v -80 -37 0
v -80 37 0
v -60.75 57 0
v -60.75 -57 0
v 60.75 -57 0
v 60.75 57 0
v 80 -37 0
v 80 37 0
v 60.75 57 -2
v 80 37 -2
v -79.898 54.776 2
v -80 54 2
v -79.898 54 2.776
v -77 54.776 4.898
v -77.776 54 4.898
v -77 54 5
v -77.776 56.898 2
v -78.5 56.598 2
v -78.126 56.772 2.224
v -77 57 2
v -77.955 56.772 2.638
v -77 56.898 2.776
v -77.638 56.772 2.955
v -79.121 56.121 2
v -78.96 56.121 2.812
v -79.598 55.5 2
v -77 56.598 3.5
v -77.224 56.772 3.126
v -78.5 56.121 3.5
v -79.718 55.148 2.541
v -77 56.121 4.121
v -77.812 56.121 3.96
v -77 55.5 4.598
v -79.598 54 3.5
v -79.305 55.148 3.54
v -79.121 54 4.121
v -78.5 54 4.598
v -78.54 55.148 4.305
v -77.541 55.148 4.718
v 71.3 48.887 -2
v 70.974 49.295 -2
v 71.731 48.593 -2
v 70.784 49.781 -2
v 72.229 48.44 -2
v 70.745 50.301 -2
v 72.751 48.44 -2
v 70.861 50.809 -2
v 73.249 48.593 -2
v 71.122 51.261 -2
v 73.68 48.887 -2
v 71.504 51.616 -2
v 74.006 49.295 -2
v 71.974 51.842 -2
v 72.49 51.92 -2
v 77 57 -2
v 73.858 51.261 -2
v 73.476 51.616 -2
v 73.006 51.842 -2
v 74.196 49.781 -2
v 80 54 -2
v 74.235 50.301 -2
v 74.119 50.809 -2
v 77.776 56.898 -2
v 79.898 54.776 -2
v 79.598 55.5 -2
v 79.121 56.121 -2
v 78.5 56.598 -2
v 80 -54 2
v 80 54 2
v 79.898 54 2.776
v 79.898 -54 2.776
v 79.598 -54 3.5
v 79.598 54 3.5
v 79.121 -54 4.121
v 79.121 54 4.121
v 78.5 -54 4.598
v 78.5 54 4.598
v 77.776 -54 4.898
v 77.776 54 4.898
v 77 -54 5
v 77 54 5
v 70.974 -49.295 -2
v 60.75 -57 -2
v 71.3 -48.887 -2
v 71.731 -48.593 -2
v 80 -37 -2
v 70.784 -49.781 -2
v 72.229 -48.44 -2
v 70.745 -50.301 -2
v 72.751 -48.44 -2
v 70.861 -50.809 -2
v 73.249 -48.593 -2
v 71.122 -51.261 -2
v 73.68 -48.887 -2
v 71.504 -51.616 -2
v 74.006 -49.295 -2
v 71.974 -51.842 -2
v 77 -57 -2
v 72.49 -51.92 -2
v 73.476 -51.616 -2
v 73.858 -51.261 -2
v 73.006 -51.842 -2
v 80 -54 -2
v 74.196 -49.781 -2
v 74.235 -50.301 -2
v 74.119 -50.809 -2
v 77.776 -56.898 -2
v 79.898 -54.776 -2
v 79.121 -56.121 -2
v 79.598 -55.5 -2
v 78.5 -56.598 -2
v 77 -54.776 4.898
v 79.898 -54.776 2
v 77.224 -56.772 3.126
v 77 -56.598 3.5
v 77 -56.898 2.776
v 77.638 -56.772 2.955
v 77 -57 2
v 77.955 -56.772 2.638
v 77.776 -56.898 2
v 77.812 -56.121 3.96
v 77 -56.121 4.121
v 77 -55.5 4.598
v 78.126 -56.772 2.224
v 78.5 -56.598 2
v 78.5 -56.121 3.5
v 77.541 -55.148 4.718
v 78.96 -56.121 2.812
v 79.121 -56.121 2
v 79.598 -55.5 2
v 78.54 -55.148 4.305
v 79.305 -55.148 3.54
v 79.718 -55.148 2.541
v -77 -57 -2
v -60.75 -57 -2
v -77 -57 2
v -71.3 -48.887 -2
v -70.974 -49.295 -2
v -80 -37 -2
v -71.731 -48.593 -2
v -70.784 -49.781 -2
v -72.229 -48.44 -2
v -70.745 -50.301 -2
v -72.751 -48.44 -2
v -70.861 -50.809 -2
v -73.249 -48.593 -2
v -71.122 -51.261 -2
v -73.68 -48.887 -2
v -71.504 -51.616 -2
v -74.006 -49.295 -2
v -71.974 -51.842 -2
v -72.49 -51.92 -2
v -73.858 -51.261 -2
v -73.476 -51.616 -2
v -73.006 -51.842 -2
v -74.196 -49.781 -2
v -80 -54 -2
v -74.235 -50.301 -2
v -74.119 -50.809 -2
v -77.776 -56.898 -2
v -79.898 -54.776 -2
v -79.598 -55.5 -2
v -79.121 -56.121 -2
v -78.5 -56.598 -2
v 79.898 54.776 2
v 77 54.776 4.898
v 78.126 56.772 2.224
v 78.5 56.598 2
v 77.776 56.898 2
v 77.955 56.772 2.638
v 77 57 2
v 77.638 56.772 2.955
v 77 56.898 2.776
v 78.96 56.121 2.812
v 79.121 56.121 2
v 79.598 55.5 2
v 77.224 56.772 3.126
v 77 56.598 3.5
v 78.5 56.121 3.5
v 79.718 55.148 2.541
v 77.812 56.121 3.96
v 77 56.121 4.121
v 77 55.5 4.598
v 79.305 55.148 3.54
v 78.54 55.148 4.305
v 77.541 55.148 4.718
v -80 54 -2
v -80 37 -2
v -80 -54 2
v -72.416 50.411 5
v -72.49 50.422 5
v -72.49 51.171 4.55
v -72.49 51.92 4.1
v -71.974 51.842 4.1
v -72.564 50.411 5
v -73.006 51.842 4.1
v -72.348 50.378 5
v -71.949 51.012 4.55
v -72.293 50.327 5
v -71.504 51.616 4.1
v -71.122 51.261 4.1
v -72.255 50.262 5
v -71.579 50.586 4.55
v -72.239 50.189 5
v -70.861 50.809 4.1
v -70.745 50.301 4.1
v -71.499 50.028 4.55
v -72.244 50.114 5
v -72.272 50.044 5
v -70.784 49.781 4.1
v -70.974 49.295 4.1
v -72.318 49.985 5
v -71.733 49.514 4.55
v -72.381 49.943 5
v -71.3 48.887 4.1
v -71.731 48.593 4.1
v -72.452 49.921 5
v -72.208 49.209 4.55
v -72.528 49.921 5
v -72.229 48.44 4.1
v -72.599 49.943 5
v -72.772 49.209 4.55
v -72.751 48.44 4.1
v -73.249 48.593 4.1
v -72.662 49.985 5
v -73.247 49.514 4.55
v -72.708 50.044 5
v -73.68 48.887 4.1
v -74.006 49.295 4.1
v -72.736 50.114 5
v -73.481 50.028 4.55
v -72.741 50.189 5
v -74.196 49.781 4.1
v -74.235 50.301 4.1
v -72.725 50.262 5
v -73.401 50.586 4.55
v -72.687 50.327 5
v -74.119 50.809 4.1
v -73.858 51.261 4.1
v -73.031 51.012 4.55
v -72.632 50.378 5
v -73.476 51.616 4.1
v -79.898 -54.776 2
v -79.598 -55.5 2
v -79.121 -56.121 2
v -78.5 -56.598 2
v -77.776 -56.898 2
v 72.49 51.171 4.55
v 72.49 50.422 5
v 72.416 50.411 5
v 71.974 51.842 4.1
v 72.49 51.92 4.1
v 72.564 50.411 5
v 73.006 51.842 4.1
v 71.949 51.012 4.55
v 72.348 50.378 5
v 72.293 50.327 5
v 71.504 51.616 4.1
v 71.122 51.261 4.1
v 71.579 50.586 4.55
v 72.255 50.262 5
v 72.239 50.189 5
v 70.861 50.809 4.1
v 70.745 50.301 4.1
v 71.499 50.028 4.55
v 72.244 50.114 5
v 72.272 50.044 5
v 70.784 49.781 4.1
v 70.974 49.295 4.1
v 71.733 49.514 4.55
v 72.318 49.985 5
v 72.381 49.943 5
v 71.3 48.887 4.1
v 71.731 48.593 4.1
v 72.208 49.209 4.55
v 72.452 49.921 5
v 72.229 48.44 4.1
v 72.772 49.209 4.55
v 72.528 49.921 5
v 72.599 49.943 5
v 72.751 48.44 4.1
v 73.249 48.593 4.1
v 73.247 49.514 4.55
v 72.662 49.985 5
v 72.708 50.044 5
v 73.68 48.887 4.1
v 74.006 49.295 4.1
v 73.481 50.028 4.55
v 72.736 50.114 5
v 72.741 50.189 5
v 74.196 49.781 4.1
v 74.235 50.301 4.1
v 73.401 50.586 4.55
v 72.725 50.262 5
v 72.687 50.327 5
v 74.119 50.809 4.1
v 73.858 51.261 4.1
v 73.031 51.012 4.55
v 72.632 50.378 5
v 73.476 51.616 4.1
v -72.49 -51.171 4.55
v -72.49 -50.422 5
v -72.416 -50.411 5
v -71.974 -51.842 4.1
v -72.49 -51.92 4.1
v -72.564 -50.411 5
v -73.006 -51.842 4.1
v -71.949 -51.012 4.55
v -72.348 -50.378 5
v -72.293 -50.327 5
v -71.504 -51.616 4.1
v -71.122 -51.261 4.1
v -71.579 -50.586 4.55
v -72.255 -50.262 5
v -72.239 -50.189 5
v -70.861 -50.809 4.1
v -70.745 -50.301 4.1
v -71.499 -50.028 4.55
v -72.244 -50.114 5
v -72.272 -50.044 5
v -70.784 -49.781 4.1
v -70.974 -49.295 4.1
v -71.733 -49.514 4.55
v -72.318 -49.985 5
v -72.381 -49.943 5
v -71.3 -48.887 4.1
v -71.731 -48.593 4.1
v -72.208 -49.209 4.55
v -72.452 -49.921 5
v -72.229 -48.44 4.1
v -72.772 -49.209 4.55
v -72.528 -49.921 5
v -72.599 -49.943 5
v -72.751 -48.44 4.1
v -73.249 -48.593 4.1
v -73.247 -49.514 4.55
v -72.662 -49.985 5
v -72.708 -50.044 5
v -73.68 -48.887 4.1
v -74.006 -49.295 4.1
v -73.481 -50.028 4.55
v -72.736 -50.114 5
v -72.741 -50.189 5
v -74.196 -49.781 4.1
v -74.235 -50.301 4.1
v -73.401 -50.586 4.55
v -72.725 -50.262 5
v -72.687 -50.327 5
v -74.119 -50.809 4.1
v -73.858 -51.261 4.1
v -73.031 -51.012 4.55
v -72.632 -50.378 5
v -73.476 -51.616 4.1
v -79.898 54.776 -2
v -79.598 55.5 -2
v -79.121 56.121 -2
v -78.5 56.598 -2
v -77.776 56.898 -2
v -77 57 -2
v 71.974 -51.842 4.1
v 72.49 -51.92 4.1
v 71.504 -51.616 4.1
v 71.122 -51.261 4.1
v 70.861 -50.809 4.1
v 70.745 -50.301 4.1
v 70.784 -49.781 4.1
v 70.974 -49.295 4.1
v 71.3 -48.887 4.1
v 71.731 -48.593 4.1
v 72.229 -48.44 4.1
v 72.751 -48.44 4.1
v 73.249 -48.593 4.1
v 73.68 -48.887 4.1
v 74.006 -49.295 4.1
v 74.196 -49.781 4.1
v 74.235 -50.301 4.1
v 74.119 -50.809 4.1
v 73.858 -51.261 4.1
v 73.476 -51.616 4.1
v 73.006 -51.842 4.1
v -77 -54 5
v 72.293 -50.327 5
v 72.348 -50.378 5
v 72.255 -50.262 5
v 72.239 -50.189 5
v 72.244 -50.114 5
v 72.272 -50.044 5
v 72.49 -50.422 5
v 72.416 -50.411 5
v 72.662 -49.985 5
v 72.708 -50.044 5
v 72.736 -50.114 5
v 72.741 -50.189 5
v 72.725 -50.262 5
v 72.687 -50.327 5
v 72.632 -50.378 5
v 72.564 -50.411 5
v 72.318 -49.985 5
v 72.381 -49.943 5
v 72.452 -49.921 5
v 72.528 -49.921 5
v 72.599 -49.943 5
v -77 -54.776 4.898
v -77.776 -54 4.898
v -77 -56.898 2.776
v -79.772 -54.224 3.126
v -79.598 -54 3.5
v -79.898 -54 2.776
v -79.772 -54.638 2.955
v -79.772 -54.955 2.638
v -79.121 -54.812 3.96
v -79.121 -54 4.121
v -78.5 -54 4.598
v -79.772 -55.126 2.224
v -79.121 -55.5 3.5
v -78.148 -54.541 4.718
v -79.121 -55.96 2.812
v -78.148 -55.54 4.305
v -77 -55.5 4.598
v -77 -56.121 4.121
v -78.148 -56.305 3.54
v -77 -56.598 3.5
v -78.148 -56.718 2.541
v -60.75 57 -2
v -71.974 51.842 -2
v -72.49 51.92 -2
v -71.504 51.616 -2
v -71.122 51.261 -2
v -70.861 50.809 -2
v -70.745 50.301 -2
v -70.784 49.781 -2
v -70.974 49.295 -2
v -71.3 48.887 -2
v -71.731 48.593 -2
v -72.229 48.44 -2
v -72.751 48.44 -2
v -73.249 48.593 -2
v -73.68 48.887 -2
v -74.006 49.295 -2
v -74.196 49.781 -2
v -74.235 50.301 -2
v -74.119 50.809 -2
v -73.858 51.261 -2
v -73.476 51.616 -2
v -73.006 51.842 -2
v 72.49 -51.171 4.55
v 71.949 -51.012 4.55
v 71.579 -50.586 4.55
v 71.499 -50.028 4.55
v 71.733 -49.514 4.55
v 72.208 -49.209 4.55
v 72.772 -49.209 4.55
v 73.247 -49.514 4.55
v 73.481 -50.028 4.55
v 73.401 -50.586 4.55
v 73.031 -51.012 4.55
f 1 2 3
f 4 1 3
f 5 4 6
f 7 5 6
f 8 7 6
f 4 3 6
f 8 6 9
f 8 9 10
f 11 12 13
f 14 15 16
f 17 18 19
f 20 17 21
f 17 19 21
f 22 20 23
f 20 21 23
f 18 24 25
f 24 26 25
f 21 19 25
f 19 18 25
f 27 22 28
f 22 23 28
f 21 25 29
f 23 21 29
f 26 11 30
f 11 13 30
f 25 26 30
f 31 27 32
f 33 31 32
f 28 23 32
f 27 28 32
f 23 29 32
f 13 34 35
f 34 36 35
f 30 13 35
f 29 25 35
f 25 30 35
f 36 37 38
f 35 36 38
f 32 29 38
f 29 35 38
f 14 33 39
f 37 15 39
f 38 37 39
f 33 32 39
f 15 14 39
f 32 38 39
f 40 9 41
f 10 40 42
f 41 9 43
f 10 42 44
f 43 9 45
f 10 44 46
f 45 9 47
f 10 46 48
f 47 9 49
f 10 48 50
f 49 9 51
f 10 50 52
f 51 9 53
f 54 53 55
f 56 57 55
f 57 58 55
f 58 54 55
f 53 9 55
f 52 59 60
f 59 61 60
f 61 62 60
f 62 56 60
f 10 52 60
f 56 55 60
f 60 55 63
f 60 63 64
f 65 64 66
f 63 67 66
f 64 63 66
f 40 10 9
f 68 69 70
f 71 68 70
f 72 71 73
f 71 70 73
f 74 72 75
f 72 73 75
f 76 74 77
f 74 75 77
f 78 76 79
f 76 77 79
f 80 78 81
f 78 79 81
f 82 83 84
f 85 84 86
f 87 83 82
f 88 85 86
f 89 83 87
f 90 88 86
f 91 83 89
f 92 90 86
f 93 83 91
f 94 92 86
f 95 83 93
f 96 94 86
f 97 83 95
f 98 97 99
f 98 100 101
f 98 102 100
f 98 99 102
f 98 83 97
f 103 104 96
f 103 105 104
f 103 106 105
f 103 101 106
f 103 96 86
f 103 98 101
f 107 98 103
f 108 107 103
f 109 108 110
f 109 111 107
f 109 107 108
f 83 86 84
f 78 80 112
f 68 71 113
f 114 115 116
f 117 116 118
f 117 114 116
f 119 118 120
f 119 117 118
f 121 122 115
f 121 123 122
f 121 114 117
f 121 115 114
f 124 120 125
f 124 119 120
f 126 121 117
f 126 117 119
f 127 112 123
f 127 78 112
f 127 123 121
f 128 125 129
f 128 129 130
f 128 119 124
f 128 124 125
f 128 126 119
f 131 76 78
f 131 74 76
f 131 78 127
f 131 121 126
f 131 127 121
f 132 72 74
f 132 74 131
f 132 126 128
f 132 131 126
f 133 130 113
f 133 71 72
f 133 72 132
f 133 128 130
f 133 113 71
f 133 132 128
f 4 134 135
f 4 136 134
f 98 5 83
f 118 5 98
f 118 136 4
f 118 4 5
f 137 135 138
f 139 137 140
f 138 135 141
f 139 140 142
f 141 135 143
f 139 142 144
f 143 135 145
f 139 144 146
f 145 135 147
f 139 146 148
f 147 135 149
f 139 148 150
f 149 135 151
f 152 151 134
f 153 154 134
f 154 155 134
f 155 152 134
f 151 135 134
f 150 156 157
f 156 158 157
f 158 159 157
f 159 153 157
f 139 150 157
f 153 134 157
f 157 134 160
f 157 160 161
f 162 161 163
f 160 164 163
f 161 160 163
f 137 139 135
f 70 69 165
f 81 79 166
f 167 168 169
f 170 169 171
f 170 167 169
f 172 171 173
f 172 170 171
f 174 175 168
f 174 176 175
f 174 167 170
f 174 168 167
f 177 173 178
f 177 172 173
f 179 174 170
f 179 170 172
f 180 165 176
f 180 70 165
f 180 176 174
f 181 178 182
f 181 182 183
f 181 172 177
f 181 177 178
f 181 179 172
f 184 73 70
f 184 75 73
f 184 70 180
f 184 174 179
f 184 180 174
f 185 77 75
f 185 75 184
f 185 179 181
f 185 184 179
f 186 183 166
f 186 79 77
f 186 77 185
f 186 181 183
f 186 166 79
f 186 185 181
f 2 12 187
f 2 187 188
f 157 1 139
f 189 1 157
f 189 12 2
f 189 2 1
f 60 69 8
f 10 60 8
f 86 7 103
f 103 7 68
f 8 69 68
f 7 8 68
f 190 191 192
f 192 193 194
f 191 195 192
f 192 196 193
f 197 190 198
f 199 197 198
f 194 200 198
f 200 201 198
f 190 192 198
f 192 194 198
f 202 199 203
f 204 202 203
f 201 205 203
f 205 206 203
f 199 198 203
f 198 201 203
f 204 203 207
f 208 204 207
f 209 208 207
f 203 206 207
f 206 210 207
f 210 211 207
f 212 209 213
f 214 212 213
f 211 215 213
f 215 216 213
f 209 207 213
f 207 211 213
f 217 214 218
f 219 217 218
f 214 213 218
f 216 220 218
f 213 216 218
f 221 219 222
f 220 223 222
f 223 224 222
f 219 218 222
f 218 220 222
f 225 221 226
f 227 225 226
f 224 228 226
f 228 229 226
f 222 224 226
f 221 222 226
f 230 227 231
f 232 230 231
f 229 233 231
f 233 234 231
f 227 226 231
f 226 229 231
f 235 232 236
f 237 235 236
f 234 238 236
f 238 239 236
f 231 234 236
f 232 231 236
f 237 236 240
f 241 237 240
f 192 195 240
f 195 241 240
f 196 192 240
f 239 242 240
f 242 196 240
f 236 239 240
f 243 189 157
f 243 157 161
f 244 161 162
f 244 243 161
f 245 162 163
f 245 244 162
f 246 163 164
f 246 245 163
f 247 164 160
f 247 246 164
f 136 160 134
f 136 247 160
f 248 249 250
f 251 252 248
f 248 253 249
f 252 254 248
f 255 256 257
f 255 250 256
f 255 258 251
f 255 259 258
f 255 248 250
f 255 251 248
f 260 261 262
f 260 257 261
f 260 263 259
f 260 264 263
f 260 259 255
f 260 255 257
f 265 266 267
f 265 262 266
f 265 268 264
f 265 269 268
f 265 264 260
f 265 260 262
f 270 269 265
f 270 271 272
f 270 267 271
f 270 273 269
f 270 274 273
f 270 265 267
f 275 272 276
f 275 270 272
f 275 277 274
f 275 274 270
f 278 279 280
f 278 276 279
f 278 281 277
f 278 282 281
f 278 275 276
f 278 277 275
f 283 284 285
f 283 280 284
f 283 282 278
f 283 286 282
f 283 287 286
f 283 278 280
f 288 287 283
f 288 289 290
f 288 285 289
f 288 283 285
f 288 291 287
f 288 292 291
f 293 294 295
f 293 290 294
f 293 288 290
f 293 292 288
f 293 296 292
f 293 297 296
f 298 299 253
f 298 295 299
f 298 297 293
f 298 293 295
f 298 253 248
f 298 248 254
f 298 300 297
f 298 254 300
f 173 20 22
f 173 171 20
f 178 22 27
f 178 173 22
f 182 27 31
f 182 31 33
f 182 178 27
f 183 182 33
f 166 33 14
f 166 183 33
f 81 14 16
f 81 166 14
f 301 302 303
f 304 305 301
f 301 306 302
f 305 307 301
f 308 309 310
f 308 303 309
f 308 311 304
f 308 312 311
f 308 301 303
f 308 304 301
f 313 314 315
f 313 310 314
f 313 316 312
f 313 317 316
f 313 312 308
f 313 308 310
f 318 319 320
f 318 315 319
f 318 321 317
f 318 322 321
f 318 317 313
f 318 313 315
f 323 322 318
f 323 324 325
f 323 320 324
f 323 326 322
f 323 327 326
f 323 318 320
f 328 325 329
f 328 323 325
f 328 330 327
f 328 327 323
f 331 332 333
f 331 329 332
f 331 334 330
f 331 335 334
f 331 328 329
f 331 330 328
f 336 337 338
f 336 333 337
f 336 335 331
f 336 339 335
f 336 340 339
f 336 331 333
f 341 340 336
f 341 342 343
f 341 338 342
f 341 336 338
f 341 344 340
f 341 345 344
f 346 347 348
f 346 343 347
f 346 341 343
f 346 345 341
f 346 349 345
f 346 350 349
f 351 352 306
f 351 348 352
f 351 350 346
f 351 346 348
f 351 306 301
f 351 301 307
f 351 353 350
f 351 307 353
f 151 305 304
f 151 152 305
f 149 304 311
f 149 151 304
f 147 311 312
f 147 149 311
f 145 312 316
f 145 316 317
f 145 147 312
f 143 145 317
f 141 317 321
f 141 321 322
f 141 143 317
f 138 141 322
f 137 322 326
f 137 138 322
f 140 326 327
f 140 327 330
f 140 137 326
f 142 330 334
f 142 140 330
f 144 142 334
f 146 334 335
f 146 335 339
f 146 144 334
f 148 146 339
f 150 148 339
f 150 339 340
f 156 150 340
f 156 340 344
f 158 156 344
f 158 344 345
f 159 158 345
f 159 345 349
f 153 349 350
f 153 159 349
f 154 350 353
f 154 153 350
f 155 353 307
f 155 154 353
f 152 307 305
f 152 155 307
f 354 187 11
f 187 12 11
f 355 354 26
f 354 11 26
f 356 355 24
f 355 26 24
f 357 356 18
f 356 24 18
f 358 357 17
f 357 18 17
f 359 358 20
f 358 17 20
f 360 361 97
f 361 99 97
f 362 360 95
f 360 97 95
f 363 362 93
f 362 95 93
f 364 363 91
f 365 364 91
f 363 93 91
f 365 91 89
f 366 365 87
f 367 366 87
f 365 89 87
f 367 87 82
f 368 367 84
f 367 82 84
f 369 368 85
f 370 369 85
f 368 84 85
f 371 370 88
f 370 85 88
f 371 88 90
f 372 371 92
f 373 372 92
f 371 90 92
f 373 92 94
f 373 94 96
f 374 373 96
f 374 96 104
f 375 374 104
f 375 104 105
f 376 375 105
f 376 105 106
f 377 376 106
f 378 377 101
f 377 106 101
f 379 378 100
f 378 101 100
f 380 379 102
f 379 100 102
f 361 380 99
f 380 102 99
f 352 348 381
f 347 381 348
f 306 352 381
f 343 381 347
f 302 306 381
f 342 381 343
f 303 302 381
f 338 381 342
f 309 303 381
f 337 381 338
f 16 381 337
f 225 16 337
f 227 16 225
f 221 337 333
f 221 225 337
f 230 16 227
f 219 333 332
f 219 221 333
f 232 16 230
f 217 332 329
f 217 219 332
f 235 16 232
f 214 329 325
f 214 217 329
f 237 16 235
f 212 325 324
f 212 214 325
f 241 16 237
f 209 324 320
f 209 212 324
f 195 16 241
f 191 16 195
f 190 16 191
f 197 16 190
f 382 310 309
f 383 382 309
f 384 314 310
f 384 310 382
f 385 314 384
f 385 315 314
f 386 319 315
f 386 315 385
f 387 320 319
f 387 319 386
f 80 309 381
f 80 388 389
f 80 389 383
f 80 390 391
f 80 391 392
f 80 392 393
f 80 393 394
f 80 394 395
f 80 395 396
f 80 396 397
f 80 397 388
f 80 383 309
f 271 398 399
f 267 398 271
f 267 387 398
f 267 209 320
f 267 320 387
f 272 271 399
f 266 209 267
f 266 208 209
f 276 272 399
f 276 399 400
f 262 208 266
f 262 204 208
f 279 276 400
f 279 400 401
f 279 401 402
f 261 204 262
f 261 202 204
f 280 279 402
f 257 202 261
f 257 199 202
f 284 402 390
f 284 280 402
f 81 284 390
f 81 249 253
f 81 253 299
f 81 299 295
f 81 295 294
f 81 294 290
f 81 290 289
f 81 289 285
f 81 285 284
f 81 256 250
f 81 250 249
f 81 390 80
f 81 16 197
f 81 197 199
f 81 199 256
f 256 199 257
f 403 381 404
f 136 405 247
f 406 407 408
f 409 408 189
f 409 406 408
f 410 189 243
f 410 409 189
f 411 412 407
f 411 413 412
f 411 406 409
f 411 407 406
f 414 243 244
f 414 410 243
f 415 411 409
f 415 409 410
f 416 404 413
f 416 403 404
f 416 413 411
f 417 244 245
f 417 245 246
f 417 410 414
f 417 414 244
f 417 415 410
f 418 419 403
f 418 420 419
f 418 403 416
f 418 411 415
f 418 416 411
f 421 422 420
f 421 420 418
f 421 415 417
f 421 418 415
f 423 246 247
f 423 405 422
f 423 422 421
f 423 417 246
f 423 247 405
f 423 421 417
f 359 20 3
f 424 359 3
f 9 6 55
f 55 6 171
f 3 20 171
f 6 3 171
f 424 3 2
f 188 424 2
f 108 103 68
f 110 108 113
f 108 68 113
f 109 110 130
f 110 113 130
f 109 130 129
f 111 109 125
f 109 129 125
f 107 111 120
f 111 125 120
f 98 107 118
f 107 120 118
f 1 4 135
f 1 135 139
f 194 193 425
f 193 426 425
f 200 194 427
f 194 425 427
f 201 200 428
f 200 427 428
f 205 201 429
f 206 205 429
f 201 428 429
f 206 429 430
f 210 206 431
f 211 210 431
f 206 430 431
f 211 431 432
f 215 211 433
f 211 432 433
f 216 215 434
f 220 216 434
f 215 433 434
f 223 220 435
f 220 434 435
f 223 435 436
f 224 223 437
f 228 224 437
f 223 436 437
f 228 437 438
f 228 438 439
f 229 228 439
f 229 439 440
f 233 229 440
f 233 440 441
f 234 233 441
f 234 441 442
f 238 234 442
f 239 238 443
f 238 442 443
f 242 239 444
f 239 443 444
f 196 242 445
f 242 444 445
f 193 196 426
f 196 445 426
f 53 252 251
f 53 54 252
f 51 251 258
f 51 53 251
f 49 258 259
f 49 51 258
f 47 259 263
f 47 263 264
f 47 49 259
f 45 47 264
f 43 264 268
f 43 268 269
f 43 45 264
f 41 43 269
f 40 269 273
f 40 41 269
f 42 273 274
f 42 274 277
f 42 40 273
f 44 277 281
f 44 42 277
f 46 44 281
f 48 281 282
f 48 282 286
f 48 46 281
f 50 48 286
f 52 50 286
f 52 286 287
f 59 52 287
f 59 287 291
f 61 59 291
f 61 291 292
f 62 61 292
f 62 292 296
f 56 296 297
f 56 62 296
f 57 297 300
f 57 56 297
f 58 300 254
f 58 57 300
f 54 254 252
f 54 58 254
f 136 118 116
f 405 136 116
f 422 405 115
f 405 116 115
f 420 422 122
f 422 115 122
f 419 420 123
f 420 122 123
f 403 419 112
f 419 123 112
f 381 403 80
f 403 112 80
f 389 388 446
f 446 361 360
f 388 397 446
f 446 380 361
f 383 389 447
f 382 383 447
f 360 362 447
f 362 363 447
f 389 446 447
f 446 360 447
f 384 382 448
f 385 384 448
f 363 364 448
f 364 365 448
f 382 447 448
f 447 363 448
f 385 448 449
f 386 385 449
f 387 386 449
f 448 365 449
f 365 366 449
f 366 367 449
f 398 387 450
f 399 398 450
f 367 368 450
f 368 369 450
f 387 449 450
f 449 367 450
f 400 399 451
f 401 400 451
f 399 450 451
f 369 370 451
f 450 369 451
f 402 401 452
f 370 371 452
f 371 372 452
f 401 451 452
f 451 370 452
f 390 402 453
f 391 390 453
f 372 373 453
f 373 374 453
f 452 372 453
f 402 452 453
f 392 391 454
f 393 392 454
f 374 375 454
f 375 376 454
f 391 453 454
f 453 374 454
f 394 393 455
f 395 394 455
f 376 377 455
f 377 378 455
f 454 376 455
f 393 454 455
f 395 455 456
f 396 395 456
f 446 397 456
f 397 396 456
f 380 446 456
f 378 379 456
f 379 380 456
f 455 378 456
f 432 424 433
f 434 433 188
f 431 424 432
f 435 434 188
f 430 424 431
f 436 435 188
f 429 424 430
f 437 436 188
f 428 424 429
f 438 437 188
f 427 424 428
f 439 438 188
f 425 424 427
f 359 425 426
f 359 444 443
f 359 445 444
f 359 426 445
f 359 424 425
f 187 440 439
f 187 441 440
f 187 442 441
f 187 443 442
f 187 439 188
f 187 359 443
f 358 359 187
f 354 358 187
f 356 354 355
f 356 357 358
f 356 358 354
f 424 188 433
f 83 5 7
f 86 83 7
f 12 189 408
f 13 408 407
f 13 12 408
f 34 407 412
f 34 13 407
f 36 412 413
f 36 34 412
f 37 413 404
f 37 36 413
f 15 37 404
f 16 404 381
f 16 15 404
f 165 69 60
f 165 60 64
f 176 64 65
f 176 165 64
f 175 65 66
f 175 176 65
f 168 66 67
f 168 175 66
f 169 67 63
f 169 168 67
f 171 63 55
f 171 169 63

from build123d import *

# Parameters (mm, degrees)
SKETCH2_W                                = 160
SKETCH2_H                                = 114
BOSS_EXTRUDE1_DEPTH                      = 5
FILLET1_R                                = 3
BOSS_EXTRUDE2_DEPTH                      = 2
MIRROR1_AT_THE_SECOND_PLANE_COPY_1_DEPTH = 2


with BuildPart() as part:
    # Sketch2 → Boss-Extrude1 (new body)
    with BuildSketch(Plane.XY):
        Rectangle(SKETCH2_W, SKETCH2_H)
    extrude(amount=BOSS_EXTRUDE1_DEPTH)

    # Fillet1
    fillet1_edges = [part.edges().sort_by_distance(p)[0] for p in [
        (80, 0, 5),
        (0, -57, 5),
        (-80, 0, 5),
        (-80, -57, 2.5),
        (80, -57, 2.5),
        (80, 57, 2.5),
        (-80, 57, 2.5),
        (0, 57, 5),
    ]]
    fillet(fillet1_edges, radius=FILLET1_R)

    # Sketch5 → Boss-Extrude2 (add)
    with BuildSketch(Plane(origin=(0, 0, 0), x_dir=(-1, 0, 0), z_dir=(0, 0, -1))):
        with BuildLine():
            Line((-60.75, 57), (-80, 37))
            Line((-80, 37), (-80, 54))
            ThreePointArc((-80, 54), (-79.121320344, 56.121320344), (-77, 57))
            Line((-77, 57), (-60.75, 57))
        make_face()
    boss_extrude2 = extrude(amount=BOSS_EXTRUDE2_DEPTH)

    # Sketch7 → Ø3.0mm Dowel Hole1 (revolve, cut)
    with BuildSketch(Plane(origin=(72.49, 50.17, -2), x_dir=(0, 1, 0), z_dir=(1, 0, 0))):
        Polygon((0, 0), (0, 7.151506083), (1.75, 6.1), (1.75, 0), align=None)
    f_3_0mm_dowel_hole1 = revolve(axis=Axis((72.49, 50.17, -8.35), (0, 0, 1)), mode=Mode.SUBTRACT)

    # Mirror1: Boss-Extrude2, Ø3.0mm Dowel Hole1 across plane
    add(boss_extrude2.mirror(Plane.ZX))
    add(f_3_0mm_dowel_hole1.mirror(Plane.ZX), mode=Mode.SUBTRACT)

    # Mirror1 at the second plane: Boss-Extrude2, Ø3.0mm Dowel Hole1 across plane
    add(boss_extrude2.mirror(Plane(origin=(0, 0, 0), x_dir=(0, 0, 1), z_dir=(1, 0, 0))))
    add(f_3_0mm_dowel_hole1.mirror(Plane(origin=(0, 0, 0), x_dir=(0, 0, 1), z_dir=(1, 0, 0))), mode=Mode.SUBTRACT)

    # Mirror1 at the second plane copy 1 sketc → Mirror1 at the second plane copy 1 (add)
    with BuildSketch(Plane(origin=(0, 0, 0), x_dir=(1, 0, 0), z_dir=(0, 0, -1))):
        with BuildLine():
            Line((-60.75, 57), (-80, 37))
            Line((-80, 37), (-80, 54))
            ThreePointArc((-80, 54), (-79.121320344, 56.121320344), (-77, 57))
            Line((-77, 57), (-60.75, 57))
        make_face()
    extrude(amount=MIRROR1_AT_THE_SECOND_PLANE_COPY_1_DEPTH)

    # Mirror1 at the second plane copy 2 sketc → Mirror1 at the second plane copy 2 (revolve, cut)
    with BuildSketch(Plane(origin=(-72.49, -50.17, -2), x_dir=(0, -1, 0), z_dir=(-1, 0, 0))):
        Polygon((0, 0), (0, 7.151506083), (1.75, 6.1), (1.75, 0), align=None)
    revolve(axis=Axis((-72.49, -50.17, -8.35), (0, 0, 1)), mode=Mode.SUBTRACT)


solid = part.part
